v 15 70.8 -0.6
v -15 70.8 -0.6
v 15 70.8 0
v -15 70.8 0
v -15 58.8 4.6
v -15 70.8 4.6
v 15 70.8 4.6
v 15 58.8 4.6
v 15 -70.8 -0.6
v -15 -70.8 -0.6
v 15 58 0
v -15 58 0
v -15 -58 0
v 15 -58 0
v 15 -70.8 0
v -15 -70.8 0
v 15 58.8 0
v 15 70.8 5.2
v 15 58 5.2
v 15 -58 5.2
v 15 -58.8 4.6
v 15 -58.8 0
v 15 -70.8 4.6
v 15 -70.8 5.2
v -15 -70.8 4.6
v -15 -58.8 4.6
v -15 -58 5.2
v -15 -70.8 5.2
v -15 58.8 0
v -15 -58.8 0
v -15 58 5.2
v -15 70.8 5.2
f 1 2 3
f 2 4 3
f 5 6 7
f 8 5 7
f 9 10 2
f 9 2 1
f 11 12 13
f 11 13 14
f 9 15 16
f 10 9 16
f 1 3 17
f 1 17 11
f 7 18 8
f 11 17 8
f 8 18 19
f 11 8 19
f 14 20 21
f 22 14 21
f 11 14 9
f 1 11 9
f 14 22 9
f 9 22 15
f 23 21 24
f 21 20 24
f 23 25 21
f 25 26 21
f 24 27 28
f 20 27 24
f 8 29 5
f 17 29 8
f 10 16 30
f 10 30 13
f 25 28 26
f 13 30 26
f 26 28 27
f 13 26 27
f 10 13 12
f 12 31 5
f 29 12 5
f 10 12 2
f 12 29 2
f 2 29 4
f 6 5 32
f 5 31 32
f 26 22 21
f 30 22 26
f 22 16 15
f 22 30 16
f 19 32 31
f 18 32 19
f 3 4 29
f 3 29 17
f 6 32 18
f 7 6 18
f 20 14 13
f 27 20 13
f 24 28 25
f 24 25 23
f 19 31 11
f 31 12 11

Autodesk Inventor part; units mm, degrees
ref_plane "YZ Plane" through (0, 0, 0) normal (1, 0, 0) x (0, 1, 0)
ref_plane "XZ Plane" through (0, 0, 0) normal (0, 1, 0) x (-1, 0, 0)
ref_plane "XY Plane" through (0, 0, 0) normal (0, 0, 1) x (1, 0, 0)
sketch "Sketch1" plane through (0, 0, 0) normal (0, 0, 1) x (1, 0, 0)
  line L0 (-15, 70.8) -> (15, 70.8)
  line L1 (15, 70.8) -> (15, -70.8)
  line L2 (15, -70.8) -> (-15, -70.8)
  line L3 (-15, -70.8) -> (-15, 70.8)
  line L4 (0, 70.8) -> (0, -70.8) construction
  line L5 (-15, 58.8) -> (15, 58.8)
  line L6 (15, 58.8) -> (15, -58.8)
  line L7 (15, -58.8) -> (-15, -58.8)
  line L8 (-15, -58.8) -> (-15, 58.8)
  line L9 (0, 58.8) -> (0, -58.8) construction
  line L10 (-15, 58) -> (15, 58)
  line L11 (15, 58) -> (15, -58)
  line L12 (15, -58) -> (-15, -58)
  line L13 (-15, -58) -> (-15, 58)
  line L14 (0, 58) -> (0, -58) construction
  point P0 (0, 0)
  point P1 (0, 0)
  point P2 (15, -58)
  point P3 (-15, -58)
  point P4 (-15, -58.8)
  point P5 (15, -58.8)
  point P6 (-15, 58)
  point P7 (15, 58)
  point P8 (15, 58.8)
  point P9 (-15, 58.8)
  dimension "d0" = 141.6
  dimension "d1" = 30
  dimension "d4" = 117.6
  dimension "d5" = 116
extrude "Extrusion1" add sketch "Sketch1" against normal blind 0.6
extrude "Extrusion2" add sketch "Sketch1" along normal blind 5.2 contours L5 L1 L10 L3 | L12 L1 L7 L3
ref_plane "upper Plane" through (0, 0, 5.2) normal (0, 0, 1) x (1, 0, 0)
sketch "Sketch2" plane through (0, 0, 5.2) normal (0, 0, 1) x (1, 0, 0)
  line L0 (-15, 70.8) -> (15, 70.8) projected
  line L1 (-15, 70.8) -> (-15, 58.8) projected
  line L2 (-15, 58) -> (-15, -58) projected
  line L3 (-15, -58) -> (-15, -58.8) projected
  line L4 (-15, -58.8) -> (-15, -70.8) projected
  line L5 (-15, -70.8) -> (15, -70.8) projected
  line L6 (15, -70.8) -> (15, -58.8) projected
  line L7 (15, -58.8) -> (15, -58) projected
  line L8 (15, -58) -> (15, 58) projected
  line L9 (15, 58.8) -> (15, 70.8) projected
  line L10 (15, 58) -> (15, 58.8) projected
  line L11 (-15, 58.8) -> (-15, 58) projected
  line L12 (15, 58.8) -> (-15, 58.8) projected
  line L13 (-15, -58.8) -> (15, -58.8) projected
  point P0 (0, 0)
extrude "Extrusion4" add sketch "Sketch2" against normal blind 0.6 contours L0 L9 L12 L1 | L13 L6 L5 L4
equation "\"d0\" = coil_spacer_width + 2 * grab_distance"
equation "\"d1\" = coil_spacer_length"
equation "\"d4\" = coil_spacer_width"
equation "\"d5\" = coil_spacer_width - 2 * wire_diameter_tolerance"
equation "\"d2\" = coil_spacer_thickness"
equation "\"d6\" = wire_diameter"
equation "\"d11\" = coil_spacer_thickness"
equation "\"coil_spacer_length\" = 30"
equation "\"coil_spacer_width\" = 117.6"
equation "\"coil_spacer_thickness\" = 0.6"
equation "\"grab_distance\" = 12"
equation "\"wire_diameter_tolerance\" = 0.8"
equation "\"wire_diameter\" = 5.2"
properties part number "coil_spacer"
